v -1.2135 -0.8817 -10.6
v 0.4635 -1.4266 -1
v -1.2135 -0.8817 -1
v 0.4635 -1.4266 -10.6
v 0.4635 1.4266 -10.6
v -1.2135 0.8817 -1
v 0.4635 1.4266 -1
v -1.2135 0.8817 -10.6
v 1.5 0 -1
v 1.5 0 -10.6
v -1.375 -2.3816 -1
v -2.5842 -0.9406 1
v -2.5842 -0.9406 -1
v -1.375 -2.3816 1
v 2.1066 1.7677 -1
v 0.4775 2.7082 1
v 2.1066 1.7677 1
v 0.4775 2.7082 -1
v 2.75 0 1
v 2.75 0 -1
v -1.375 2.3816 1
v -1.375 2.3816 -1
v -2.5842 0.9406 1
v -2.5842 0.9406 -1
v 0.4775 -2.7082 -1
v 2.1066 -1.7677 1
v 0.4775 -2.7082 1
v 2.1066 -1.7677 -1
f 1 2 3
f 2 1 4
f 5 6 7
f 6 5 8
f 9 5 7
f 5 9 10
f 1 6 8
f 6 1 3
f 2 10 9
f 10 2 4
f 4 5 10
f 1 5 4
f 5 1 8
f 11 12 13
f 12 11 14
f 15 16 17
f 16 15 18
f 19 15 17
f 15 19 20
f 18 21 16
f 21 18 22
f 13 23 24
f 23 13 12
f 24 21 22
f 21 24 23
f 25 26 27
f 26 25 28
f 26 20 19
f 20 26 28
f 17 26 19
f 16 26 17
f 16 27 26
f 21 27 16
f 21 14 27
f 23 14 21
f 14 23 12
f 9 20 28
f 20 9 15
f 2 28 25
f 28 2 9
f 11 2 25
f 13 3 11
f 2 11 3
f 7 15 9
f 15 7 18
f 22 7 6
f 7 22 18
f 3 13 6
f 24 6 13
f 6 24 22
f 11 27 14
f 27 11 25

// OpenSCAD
// Parameters
shaft_diameter = 3; //[1.5:6:0.1]
length_under_head = 10; //[5:20:0.5]
head_diameter = 5.5; //[2.75:11:0.1]
head_height = 2; //[1:4:0.1]
overlap = 0.8; //[0.2:2:0.1]
drive_enabled = 0; //[0:1:1]
drive_socket_radius = 1.2; //[0.6:2.4:0.1]
drive_socket_depth = 1; //[0.5:2:0.1]
thread_enabled = 0; //[0:1:1]
thread_minor_diameter = 2.6; //[1.3:5.2:0.1]
thread_length = 8; //[4:16:0.5]
washer_enabled = 0; //[0:1:1]
washer_outer_diameter = 7; //[3.5:14:0.1]
washer_thickness = 1; //[0.5:2:0.1]
spacer_enabled = 0; //[0:1:1]
spacer_height = 6; //[3:12:0.5]
spacer_wall = 1.8; //[0.9:3.6:0.1]
buzzer_enabled = 0; //[0:1:1]
buzzer_radius = 6; //[3:12:0.5]
buzzer_height = 4; //[2:8:0.5]

// Screw and Washer - complete geometry
module screw_and_washer() {
  color("DimGray") {
    // Shaft
    translate([0, 0, -head_height/2 - length_under_head/2 + overlap/2])
      cylinder(h=length_under_head, r=shaft_diameter/2, center=true);
    
    // Pan Head
    translate([0, 0, 0])
      cylinder(h=head_height, r=head_diameter/2, center=true);
    
    // Drive Recess (optional)
    if (drive_enabled) {
      translate([0, 0, head_height/2 - drive_socket_depth/2])
        cylinder(h=drive_socket_depth + overlap, r=drive_socket_radius, center=true);
    }
    
    // Thread Representation (optional)
    if (thread_enabled) {
      translate([0, 0, -head_height/2 - length_under_head + thread_length/2 + overlap/2])
        cylinder(h=thread_length, r=thread_minor_diameter/2, center=true);
    }
    
    // Washer (optional)
    if (washer_enabled) {
      difference() {
        translate([0, 0, -head_height/2 - washer_thickness/2 + overlap/2])
          cylinder(h=washer_thickness, r=washer_outer_diameter/2, center=true);
        translate([0, 0, -head_height/2 - washer_thickness/2 + overlap/2])
          cylinder(h=washer_thickness + 2*overlap, r=shaft_diameter/2 + overlap/2, center=true);
      }
    }
  }
}

// PCB Spacer - complete geometry
module pcb_spacer() {
  if (spacer_enabled) {
    color("Silver") {
      difference() {
        translate([0, 0, -head_height/2 - washer_thickness - spacer_height/2 + overlap])
          cylinder(h=spacer_height, r=shaft_diameter/2 + spacer_wall, center=true);
        translate([0, 0, -head_height/2 - washer_thickness - spacer_height/2 + overlap])
          cylinder(h=spacer_height + 2*overlap, r=shaft_diameter/2 + overlap/2, center=true);
      }
    }
  }
}

// Buzzer - complete geometry
module buzzer() {
  if (buzzer_enabled) {
    color("Black") {
      translate([0, 0, -head_height/2 - washer_thickness - spacer_height - buzzer_height/2 + overlap])
        cylinder(h=buzzer_height, r=buzzer_radius, center=true);
    }
  }
}

// Assembly
module assembly() {
  screw_and_washer();
  pcb_spacer();
  buzzer();
}

assembly();
